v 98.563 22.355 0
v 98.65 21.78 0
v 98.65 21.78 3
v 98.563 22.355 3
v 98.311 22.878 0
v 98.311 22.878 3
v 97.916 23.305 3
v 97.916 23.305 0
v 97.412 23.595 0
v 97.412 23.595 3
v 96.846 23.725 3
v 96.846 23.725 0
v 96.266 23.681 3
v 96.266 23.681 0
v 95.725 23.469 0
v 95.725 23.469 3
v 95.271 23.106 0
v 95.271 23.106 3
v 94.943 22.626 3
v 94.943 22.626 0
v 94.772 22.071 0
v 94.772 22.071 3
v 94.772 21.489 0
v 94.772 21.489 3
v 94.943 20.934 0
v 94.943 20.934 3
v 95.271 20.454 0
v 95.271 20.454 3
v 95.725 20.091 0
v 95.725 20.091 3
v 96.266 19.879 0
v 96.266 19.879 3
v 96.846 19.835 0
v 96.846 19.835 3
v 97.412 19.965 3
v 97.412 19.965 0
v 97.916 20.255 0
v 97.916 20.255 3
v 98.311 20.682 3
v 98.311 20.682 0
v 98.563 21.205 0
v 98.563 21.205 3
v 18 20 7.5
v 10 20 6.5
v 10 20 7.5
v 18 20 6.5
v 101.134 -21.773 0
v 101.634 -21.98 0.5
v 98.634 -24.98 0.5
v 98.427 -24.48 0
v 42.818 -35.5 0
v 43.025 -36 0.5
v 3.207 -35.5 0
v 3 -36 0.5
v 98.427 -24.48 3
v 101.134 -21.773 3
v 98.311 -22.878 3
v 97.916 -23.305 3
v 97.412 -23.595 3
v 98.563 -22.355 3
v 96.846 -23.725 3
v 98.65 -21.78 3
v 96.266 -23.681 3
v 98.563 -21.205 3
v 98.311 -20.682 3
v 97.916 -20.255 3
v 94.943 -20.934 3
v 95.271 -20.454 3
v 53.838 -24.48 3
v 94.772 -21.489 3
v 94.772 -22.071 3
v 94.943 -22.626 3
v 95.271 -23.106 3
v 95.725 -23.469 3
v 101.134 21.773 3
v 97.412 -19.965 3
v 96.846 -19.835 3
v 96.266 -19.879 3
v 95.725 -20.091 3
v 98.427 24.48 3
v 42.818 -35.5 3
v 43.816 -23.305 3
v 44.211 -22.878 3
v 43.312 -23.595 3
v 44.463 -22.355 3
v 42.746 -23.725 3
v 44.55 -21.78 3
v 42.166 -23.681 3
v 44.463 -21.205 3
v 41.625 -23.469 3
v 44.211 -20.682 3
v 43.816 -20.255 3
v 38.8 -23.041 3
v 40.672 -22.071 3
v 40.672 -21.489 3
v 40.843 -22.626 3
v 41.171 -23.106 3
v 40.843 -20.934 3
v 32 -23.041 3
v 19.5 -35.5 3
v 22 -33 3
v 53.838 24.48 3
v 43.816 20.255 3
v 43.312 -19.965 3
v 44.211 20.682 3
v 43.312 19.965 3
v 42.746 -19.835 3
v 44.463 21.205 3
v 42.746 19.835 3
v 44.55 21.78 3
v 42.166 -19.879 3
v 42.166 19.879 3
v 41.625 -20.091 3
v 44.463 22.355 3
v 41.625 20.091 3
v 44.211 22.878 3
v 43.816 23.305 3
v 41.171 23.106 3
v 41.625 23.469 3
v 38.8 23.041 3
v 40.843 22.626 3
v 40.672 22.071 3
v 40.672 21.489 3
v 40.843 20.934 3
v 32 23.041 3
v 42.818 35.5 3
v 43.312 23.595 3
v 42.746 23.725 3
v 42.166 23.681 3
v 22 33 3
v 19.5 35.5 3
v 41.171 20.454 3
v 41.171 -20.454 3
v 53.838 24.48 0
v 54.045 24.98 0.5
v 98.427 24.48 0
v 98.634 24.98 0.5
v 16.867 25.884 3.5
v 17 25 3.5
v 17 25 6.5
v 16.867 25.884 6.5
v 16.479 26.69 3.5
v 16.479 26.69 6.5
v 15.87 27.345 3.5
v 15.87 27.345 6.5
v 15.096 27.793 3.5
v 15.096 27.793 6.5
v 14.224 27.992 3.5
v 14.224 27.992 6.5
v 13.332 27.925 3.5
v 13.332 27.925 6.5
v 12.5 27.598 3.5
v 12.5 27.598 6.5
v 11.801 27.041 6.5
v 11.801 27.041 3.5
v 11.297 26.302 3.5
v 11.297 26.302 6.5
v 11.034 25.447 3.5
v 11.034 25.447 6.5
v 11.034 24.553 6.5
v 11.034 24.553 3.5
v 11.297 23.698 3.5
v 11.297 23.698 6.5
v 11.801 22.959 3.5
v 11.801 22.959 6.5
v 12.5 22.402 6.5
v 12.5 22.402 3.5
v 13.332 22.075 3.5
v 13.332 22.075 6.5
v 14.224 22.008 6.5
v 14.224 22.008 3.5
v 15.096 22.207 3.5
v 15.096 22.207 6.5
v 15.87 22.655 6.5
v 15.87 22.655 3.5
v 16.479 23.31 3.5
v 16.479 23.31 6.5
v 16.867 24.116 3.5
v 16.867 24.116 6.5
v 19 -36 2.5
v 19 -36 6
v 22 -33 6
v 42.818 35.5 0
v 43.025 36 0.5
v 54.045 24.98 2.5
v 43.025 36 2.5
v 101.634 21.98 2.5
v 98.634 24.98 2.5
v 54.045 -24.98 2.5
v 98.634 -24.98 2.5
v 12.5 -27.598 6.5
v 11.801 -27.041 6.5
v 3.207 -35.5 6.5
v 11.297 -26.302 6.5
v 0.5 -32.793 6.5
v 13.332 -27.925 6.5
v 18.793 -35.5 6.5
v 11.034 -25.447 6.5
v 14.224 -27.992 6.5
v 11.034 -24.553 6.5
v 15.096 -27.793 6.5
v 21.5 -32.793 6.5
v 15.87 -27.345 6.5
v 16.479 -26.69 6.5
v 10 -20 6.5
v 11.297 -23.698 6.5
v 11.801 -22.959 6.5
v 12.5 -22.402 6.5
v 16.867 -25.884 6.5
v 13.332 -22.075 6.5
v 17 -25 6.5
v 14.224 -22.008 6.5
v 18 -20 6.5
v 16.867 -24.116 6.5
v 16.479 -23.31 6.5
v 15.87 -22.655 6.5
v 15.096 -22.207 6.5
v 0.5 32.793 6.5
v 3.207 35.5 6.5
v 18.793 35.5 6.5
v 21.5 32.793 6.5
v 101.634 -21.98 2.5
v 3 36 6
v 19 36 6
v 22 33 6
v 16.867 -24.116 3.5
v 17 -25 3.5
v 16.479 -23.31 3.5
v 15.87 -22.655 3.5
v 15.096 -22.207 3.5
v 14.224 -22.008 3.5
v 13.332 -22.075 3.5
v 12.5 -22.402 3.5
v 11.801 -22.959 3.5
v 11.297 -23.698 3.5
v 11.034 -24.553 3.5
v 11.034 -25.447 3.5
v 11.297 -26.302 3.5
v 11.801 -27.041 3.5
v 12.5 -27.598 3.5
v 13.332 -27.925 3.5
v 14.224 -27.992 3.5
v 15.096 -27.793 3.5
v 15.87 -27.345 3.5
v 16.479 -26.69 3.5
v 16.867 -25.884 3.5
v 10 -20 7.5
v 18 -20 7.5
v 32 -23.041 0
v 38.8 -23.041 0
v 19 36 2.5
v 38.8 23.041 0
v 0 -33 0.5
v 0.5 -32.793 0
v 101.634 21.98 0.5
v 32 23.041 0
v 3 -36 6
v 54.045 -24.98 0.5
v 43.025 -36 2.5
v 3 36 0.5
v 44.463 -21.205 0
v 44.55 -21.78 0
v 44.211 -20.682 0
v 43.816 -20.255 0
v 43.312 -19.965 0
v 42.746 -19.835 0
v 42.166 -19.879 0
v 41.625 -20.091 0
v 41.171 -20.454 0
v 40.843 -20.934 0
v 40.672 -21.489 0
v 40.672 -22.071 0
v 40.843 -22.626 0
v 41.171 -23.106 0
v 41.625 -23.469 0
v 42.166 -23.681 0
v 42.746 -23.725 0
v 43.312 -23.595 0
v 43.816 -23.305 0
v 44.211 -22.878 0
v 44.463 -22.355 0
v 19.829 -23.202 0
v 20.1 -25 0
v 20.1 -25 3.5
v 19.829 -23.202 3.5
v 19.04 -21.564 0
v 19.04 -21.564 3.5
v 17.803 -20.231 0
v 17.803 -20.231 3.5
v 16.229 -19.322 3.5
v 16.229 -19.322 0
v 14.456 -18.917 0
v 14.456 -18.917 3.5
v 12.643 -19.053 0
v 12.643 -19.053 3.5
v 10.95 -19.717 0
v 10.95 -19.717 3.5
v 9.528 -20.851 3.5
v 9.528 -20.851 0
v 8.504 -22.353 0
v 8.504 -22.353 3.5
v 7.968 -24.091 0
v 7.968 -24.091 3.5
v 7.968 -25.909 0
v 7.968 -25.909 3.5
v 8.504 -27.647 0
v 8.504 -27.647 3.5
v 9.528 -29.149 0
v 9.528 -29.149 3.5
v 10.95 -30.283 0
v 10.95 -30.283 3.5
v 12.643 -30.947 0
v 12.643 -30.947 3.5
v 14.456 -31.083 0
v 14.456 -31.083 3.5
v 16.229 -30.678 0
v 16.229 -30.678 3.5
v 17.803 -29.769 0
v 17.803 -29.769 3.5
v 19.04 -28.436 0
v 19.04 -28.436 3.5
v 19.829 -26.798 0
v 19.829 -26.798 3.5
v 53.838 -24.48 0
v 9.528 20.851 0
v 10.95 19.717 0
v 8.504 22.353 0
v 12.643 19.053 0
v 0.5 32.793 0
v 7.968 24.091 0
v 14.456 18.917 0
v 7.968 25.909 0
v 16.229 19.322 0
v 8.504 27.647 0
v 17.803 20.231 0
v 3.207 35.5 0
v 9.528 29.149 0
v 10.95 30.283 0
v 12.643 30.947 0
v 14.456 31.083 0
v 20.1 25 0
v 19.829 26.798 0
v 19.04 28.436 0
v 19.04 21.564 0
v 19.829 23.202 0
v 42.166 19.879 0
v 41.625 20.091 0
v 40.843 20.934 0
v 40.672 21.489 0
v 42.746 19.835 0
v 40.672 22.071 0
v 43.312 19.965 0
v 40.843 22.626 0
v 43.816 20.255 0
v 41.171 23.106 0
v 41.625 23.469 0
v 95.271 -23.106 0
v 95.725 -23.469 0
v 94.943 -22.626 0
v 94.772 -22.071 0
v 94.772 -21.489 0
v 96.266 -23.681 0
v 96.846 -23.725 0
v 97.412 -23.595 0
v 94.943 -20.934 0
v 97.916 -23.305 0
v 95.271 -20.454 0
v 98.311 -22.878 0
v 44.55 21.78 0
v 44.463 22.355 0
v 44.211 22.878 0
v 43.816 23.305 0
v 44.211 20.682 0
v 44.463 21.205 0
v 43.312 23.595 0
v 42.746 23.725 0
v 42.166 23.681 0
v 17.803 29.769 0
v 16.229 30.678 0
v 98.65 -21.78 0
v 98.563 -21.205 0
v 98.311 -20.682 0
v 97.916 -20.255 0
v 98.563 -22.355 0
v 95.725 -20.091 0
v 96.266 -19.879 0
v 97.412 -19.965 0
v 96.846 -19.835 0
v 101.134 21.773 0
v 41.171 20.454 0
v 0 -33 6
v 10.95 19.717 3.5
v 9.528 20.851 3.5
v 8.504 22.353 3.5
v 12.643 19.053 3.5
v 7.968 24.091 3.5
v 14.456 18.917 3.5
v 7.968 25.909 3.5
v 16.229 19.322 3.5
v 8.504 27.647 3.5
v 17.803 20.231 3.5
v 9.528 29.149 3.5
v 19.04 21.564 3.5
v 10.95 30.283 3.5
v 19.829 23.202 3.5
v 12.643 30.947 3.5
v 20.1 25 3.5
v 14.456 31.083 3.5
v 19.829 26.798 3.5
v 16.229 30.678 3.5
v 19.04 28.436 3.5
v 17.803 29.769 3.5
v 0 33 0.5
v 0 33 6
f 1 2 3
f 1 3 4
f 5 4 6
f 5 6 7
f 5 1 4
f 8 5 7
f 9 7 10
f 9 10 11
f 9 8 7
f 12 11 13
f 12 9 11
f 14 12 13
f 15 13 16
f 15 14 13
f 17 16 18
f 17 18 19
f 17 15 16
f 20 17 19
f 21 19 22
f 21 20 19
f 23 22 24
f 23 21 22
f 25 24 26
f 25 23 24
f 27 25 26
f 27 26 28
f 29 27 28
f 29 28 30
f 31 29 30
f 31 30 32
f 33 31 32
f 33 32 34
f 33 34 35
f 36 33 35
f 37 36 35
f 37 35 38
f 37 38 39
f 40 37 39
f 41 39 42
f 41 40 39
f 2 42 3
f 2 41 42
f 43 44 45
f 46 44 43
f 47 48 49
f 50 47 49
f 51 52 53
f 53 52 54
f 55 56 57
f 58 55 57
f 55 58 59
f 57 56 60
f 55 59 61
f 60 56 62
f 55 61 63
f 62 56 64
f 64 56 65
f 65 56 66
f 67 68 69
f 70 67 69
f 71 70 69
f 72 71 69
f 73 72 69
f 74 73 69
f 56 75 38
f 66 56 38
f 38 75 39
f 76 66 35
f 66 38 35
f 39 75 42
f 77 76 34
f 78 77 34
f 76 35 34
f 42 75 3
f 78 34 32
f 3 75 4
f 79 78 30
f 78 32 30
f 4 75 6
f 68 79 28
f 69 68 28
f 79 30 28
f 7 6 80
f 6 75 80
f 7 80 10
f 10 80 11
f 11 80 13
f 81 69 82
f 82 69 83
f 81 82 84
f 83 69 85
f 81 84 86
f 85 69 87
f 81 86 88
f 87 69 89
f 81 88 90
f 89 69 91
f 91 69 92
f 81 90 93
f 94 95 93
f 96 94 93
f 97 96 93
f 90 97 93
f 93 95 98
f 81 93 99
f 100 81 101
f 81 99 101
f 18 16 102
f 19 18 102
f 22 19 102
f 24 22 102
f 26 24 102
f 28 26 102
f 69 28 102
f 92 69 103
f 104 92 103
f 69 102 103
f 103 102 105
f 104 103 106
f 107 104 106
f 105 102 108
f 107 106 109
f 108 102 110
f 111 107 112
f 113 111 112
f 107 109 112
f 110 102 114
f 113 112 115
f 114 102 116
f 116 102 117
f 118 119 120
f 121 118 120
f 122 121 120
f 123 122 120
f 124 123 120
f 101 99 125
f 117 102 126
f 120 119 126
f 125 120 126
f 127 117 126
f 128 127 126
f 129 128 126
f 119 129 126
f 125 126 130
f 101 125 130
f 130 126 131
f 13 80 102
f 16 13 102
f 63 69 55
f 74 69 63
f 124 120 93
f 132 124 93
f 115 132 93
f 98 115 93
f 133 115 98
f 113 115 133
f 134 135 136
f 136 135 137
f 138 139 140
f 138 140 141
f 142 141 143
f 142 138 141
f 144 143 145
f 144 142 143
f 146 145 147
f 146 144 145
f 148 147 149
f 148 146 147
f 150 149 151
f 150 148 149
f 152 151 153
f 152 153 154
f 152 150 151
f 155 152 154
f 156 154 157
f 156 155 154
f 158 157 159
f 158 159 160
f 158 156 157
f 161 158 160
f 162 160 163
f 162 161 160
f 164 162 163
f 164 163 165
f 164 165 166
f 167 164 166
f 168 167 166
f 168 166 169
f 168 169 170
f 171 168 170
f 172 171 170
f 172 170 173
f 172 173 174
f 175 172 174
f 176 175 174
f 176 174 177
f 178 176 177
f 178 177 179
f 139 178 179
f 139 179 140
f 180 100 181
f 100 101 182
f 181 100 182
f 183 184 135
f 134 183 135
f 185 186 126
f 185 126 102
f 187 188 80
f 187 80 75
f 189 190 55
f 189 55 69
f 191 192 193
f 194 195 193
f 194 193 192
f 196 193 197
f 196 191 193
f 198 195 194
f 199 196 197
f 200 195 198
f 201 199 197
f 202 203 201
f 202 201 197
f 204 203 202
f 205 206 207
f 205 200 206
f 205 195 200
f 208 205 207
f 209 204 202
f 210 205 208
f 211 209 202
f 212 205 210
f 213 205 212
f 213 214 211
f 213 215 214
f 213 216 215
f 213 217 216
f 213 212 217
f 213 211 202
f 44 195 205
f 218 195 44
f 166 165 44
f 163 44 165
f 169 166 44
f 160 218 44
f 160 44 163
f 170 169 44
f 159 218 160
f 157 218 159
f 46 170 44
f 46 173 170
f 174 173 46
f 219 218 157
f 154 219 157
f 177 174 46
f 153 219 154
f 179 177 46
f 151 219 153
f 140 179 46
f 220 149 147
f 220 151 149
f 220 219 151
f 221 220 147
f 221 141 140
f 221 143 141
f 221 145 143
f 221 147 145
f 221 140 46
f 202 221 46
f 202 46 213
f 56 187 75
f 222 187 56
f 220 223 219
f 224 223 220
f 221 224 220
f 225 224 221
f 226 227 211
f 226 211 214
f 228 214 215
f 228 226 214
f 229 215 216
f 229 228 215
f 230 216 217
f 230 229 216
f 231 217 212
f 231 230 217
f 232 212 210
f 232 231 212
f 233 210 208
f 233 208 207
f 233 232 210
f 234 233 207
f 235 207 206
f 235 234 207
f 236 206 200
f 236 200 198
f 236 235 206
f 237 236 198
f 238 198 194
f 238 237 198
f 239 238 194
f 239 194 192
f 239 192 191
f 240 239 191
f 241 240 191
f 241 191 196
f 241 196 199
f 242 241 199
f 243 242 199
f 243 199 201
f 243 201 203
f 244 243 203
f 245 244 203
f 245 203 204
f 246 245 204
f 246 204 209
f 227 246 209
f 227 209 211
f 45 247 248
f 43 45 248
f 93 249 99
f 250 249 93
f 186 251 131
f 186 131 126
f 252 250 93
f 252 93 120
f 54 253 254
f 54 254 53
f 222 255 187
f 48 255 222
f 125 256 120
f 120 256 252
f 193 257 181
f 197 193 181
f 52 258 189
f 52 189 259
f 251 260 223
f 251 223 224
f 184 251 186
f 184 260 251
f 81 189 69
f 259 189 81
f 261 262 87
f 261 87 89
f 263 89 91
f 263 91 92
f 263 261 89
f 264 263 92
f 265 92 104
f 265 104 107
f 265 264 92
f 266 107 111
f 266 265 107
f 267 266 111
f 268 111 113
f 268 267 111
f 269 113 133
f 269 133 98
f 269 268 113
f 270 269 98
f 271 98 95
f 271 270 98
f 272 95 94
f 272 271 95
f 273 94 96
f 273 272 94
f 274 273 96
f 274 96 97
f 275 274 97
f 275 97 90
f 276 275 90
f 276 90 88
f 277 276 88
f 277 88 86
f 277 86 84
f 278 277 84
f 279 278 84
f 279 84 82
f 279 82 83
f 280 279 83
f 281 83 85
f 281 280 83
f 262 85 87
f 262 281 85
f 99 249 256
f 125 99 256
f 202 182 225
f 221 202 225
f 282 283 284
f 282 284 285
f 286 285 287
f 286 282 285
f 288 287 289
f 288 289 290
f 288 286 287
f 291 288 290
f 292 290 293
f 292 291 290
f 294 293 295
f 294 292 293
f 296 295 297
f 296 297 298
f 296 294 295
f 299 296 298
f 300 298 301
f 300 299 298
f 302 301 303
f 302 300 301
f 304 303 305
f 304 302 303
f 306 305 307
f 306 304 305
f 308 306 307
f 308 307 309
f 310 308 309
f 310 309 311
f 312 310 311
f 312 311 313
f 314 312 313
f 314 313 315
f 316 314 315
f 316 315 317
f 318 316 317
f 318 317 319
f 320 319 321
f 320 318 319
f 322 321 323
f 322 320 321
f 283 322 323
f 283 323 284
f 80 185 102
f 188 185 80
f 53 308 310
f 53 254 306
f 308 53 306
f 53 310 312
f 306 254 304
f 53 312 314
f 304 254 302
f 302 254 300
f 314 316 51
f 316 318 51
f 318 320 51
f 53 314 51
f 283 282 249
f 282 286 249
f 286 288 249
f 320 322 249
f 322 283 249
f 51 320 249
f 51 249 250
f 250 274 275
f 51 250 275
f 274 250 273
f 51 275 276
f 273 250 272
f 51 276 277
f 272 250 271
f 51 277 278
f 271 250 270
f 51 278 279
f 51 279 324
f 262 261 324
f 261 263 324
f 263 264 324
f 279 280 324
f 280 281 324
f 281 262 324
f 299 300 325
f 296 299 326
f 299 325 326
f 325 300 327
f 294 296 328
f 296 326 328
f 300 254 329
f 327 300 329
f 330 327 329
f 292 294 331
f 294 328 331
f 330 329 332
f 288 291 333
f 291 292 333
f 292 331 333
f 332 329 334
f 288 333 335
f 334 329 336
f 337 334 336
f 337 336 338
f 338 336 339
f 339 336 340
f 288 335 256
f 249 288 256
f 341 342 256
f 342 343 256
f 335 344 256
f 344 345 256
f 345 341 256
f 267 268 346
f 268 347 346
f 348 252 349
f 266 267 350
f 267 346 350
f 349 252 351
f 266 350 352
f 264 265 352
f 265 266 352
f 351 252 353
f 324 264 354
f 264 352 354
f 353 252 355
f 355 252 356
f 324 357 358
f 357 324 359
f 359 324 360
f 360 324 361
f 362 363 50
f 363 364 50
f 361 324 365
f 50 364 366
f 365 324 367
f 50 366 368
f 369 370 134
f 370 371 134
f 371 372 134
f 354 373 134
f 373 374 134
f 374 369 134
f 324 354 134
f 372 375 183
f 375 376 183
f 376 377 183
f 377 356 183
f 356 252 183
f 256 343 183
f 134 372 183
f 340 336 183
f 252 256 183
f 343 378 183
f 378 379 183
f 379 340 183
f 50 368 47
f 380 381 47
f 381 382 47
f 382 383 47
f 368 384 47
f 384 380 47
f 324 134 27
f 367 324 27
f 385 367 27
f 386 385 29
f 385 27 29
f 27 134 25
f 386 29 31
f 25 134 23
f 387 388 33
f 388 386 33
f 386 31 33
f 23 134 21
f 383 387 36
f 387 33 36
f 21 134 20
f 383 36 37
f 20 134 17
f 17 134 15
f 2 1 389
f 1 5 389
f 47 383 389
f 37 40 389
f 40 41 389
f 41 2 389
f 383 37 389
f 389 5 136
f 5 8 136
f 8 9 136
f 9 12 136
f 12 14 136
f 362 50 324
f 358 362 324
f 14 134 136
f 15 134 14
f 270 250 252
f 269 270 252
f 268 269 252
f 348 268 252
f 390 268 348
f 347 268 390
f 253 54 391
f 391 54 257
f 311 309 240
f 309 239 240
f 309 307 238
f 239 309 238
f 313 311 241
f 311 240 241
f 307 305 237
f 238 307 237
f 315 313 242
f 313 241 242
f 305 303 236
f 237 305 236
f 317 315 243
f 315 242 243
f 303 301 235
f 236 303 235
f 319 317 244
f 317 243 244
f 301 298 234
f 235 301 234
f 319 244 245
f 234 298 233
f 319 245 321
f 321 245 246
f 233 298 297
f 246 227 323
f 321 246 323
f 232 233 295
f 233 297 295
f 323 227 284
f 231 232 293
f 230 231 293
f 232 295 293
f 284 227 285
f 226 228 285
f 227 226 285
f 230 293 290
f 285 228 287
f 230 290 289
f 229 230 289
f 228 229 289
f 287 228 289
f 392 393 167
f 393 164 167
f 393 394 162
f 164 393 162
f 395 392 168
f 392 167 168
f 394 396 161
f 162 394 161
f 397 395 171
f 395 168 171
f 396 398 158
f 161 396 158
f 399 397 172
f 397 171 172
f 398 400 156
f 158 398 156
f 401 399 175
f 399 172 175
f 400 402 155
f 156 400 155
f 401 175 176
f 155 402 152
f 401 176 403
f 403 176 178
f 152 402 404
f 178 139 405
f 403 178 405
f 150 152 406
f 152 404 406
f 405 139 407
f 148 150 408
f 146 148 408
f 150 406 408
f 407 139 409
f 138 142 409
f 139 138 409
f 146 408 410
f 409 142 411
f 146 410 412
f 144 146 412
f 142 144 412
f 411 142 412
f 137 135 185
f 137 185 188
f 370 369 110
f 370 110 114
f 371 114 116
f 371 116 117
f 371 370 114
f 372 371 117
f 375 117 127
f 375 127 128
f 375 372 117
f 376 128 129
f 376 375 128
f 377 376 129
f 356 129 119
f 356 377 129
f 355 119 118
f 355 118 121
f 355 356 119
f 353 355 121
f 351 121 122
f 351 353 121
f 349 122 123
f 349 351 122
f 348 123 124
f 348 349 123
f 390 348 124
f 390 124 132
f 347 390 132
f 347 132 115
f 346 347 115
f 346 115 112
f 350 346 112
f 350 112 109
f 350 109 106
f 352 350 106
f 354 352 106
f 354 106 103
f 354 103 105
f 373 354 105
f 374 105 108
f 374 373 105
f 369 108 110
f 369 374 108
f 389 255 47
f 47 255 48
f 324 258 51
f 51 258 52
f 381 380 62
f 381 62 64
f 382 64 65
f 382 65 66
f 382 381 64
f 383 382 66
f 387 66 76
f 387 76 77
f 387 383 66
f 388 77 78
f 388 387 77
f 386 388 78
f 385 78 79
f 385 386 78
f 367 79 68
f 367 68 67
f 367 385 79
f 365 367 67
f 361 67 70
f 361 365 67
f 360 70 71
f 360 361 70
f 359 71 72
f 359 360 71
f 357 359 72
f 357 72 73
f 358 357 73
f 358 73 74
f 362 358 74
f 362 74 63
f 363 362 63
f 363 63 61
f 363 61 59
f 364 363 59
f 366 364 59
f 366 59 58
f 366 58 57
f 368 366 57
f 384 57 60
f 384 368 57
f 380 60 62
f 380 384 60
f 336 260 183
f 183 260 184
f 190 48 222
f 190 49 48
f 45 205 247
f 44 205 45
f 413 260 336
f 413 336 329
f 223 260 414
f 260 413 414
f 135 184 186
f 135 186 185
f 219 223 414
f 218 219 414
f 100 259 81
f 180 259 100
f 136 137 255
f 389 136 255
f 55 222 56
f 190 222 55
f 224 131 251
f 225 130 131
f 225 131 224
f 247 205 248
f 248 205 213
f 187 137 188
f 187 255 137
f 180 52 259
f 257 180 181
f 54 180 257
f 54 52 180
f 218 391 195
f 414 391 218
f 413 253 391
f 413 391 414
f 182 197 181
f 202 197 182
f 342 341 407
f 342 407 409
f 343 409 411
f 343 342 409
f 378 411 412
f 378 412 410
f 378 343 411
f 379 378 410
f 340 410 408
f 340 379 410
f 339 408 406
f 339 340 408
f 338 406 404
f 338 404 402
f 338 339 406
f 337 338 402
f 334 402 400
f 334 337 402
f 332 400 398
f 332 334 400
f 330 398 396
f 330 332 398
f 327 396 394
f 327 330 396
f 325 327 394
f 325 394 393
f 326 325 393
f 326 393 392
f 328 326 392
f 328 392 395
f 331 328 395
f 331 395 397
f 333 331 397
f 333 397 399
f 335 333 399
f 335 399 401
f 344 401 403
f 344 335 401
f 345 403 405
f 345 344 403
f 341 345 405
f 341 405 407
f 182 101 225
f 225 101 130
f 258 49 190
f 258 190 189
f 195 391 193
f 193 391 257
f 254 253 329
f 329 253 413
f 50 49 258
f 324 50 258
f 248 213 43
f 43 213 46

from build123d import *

# Parameters (mm, degrees)
SKETCH_R        = 1.95
SKETCH_W        = 6.8
SKETCH_H        = 46.08113
PAD_DEPTH       = 3
SKETCH001_W     = 22
SKETCH001_H     = 72
PAD001_DEPTH    = 6.5
SKETCH002_W     = 8
SKETCH002_H     = 40
PAD002_DEPTH    = 7.5
SKETCH003_R     = 6.1
POCKET_DEPTH    = 3.5
SKETCH004_R     = 3
POCKET001_DEPTH = 6.5
CHAMFER_SIZE    = 3
CHAMFER001_SIZE = 0.5


with BuildPart() as part:
    # Sketch → Pad (new body)
    with BuildSketch(Plane.XY):
        Polygon((54.045437, 24.98), (101.633751, 24.98), (101.633751, -24.98), (54.045437, -24.98), (43.025437, -36), (0, -36), (0, 36), (43.025437, 36), align=None)
        with Locations((42.6, 21.78)):
            Circle(SKETCH_R, mode=Mode.SUBTRACT)
        with Locations((42.6, -21.78)):
            Circle(SKETCH_R, mode=Mode.SUBTRACT)
        with Locations((96.7, 21.78)):
            Circle(SKETCH_R, mode=Mode.SUBTRACT)
        with Locations((96.7, -21.78)):
            Circle(SKETCH_R, mode=Mode.SUBTRACT)
        with Locations((35.4, 0)):
            Rectangle(SKETCH_W, SKETCH_H, mode=Mode.SUBTRACT)
    extrude(amount=PAD_DEPTH)

    # Sketch001 → Pad001 (join)
    with BuildSketch(Plane.XY):
        with Locations((11, 0)):
            Rectangle(SKETCH001_W, SKETCH001_H)
    extrude(amount=PAD001_DEPTH)

    # Sketch002 → Pad002 (join)
    with BuildSketch(Plane.XY):
        with Locations((14, 0)):
            Rectangle(SKETCH002_W, SKETCH002_H)
    extrude(amount=PAD002_DEPTH)

    # Sketch003 → Pocket (cut)
    with BuildSketch(Plane.XY):
        with Locations((14, 25)):
            Circle(SKETCH003_R)
        with Locations((14, -25)):
            Circle(SKETCH003_R)
    extrude(amount=POCKET_DEPTH, mode=Mode.SUBTRACT)

    # Sketch004 → Pocket001 (cut)
    with BuildSketch(Plane.XY):
        with Locations((14, 25)):
            Circle(SKETCH004_R)
        with Locations((14, -25)):
            Circle(SKETCH004_R)
    extrude(amount=POCKET001_DEPTH, mode=Mode.SUBTRACT)

    # Chamfer
    chamfer_edges = [part.edges().sort_by_distance(p)[0] for p in [
        (101.633751, -24.98, 1.5),
        (101.633751, 24.98, 1.5),
        (22, 36, 4.75),
        (0, 36, 1.5),
        (0, 36, 4.75),
        (0, -36, 4.75),
        (0, -36, 1.5),
        (22, -36, 4.75),
    ]]
    chamfer(chamfer_edges, length=CHAMFER_SIZE)

    # Chamfer001
    chamfer001_edges = [part.edges().sort_by_distance(p)[0] for p in [
        (48.535437, 30.49, 3),
        (76.339594, 24.98, 3),
        (100.133751, 23.48, 3),
        (101.633751, 0, 3),
        (100.133751, -23.48, 3),
        (76.339594, -24.98, 3),
        (76.339594, -24.98, 0),
        (48.535437, -30.49, 3),
        (48.535437, -30.49, 0),
        (32.512719, -36, 0),
        (32.512719, -36, 3),
        (1.5, -34.5, 0),
        (0, 0, 0),
        (1.5, 34.5, 6.5),
        (32.512719, 36, 3),
        (11, 36, 6.5),
        (1.5, 34.5, 0),
        (12.5, 36, 0),
        (100.133751, -23.48, 0),
        (76.339594, 24.98, 0),
        (22, 0, 6.5),
        (44.55, 21.78, 1.5),
        (20.5, 34.5, 6.5),
        (20.5, -36, 3),
        (0, 0, 6.5),
        (12.5, -36, 0),
        (20.5, 36, 3),
        (32.512719, 36, 0),
        (48.535437, 30.49, 0),
        (100.133751, 23.48, 0),
        (101.633751, 0, 0),
        (20.5, -34.5, 6.5),
        (11, -36, 6.5),
        (1.5, -34.5, 6.5),
    ]]
    chamfer(chamfer001_edges, length=CHAMFER001_SIZE)


solid = part.part
